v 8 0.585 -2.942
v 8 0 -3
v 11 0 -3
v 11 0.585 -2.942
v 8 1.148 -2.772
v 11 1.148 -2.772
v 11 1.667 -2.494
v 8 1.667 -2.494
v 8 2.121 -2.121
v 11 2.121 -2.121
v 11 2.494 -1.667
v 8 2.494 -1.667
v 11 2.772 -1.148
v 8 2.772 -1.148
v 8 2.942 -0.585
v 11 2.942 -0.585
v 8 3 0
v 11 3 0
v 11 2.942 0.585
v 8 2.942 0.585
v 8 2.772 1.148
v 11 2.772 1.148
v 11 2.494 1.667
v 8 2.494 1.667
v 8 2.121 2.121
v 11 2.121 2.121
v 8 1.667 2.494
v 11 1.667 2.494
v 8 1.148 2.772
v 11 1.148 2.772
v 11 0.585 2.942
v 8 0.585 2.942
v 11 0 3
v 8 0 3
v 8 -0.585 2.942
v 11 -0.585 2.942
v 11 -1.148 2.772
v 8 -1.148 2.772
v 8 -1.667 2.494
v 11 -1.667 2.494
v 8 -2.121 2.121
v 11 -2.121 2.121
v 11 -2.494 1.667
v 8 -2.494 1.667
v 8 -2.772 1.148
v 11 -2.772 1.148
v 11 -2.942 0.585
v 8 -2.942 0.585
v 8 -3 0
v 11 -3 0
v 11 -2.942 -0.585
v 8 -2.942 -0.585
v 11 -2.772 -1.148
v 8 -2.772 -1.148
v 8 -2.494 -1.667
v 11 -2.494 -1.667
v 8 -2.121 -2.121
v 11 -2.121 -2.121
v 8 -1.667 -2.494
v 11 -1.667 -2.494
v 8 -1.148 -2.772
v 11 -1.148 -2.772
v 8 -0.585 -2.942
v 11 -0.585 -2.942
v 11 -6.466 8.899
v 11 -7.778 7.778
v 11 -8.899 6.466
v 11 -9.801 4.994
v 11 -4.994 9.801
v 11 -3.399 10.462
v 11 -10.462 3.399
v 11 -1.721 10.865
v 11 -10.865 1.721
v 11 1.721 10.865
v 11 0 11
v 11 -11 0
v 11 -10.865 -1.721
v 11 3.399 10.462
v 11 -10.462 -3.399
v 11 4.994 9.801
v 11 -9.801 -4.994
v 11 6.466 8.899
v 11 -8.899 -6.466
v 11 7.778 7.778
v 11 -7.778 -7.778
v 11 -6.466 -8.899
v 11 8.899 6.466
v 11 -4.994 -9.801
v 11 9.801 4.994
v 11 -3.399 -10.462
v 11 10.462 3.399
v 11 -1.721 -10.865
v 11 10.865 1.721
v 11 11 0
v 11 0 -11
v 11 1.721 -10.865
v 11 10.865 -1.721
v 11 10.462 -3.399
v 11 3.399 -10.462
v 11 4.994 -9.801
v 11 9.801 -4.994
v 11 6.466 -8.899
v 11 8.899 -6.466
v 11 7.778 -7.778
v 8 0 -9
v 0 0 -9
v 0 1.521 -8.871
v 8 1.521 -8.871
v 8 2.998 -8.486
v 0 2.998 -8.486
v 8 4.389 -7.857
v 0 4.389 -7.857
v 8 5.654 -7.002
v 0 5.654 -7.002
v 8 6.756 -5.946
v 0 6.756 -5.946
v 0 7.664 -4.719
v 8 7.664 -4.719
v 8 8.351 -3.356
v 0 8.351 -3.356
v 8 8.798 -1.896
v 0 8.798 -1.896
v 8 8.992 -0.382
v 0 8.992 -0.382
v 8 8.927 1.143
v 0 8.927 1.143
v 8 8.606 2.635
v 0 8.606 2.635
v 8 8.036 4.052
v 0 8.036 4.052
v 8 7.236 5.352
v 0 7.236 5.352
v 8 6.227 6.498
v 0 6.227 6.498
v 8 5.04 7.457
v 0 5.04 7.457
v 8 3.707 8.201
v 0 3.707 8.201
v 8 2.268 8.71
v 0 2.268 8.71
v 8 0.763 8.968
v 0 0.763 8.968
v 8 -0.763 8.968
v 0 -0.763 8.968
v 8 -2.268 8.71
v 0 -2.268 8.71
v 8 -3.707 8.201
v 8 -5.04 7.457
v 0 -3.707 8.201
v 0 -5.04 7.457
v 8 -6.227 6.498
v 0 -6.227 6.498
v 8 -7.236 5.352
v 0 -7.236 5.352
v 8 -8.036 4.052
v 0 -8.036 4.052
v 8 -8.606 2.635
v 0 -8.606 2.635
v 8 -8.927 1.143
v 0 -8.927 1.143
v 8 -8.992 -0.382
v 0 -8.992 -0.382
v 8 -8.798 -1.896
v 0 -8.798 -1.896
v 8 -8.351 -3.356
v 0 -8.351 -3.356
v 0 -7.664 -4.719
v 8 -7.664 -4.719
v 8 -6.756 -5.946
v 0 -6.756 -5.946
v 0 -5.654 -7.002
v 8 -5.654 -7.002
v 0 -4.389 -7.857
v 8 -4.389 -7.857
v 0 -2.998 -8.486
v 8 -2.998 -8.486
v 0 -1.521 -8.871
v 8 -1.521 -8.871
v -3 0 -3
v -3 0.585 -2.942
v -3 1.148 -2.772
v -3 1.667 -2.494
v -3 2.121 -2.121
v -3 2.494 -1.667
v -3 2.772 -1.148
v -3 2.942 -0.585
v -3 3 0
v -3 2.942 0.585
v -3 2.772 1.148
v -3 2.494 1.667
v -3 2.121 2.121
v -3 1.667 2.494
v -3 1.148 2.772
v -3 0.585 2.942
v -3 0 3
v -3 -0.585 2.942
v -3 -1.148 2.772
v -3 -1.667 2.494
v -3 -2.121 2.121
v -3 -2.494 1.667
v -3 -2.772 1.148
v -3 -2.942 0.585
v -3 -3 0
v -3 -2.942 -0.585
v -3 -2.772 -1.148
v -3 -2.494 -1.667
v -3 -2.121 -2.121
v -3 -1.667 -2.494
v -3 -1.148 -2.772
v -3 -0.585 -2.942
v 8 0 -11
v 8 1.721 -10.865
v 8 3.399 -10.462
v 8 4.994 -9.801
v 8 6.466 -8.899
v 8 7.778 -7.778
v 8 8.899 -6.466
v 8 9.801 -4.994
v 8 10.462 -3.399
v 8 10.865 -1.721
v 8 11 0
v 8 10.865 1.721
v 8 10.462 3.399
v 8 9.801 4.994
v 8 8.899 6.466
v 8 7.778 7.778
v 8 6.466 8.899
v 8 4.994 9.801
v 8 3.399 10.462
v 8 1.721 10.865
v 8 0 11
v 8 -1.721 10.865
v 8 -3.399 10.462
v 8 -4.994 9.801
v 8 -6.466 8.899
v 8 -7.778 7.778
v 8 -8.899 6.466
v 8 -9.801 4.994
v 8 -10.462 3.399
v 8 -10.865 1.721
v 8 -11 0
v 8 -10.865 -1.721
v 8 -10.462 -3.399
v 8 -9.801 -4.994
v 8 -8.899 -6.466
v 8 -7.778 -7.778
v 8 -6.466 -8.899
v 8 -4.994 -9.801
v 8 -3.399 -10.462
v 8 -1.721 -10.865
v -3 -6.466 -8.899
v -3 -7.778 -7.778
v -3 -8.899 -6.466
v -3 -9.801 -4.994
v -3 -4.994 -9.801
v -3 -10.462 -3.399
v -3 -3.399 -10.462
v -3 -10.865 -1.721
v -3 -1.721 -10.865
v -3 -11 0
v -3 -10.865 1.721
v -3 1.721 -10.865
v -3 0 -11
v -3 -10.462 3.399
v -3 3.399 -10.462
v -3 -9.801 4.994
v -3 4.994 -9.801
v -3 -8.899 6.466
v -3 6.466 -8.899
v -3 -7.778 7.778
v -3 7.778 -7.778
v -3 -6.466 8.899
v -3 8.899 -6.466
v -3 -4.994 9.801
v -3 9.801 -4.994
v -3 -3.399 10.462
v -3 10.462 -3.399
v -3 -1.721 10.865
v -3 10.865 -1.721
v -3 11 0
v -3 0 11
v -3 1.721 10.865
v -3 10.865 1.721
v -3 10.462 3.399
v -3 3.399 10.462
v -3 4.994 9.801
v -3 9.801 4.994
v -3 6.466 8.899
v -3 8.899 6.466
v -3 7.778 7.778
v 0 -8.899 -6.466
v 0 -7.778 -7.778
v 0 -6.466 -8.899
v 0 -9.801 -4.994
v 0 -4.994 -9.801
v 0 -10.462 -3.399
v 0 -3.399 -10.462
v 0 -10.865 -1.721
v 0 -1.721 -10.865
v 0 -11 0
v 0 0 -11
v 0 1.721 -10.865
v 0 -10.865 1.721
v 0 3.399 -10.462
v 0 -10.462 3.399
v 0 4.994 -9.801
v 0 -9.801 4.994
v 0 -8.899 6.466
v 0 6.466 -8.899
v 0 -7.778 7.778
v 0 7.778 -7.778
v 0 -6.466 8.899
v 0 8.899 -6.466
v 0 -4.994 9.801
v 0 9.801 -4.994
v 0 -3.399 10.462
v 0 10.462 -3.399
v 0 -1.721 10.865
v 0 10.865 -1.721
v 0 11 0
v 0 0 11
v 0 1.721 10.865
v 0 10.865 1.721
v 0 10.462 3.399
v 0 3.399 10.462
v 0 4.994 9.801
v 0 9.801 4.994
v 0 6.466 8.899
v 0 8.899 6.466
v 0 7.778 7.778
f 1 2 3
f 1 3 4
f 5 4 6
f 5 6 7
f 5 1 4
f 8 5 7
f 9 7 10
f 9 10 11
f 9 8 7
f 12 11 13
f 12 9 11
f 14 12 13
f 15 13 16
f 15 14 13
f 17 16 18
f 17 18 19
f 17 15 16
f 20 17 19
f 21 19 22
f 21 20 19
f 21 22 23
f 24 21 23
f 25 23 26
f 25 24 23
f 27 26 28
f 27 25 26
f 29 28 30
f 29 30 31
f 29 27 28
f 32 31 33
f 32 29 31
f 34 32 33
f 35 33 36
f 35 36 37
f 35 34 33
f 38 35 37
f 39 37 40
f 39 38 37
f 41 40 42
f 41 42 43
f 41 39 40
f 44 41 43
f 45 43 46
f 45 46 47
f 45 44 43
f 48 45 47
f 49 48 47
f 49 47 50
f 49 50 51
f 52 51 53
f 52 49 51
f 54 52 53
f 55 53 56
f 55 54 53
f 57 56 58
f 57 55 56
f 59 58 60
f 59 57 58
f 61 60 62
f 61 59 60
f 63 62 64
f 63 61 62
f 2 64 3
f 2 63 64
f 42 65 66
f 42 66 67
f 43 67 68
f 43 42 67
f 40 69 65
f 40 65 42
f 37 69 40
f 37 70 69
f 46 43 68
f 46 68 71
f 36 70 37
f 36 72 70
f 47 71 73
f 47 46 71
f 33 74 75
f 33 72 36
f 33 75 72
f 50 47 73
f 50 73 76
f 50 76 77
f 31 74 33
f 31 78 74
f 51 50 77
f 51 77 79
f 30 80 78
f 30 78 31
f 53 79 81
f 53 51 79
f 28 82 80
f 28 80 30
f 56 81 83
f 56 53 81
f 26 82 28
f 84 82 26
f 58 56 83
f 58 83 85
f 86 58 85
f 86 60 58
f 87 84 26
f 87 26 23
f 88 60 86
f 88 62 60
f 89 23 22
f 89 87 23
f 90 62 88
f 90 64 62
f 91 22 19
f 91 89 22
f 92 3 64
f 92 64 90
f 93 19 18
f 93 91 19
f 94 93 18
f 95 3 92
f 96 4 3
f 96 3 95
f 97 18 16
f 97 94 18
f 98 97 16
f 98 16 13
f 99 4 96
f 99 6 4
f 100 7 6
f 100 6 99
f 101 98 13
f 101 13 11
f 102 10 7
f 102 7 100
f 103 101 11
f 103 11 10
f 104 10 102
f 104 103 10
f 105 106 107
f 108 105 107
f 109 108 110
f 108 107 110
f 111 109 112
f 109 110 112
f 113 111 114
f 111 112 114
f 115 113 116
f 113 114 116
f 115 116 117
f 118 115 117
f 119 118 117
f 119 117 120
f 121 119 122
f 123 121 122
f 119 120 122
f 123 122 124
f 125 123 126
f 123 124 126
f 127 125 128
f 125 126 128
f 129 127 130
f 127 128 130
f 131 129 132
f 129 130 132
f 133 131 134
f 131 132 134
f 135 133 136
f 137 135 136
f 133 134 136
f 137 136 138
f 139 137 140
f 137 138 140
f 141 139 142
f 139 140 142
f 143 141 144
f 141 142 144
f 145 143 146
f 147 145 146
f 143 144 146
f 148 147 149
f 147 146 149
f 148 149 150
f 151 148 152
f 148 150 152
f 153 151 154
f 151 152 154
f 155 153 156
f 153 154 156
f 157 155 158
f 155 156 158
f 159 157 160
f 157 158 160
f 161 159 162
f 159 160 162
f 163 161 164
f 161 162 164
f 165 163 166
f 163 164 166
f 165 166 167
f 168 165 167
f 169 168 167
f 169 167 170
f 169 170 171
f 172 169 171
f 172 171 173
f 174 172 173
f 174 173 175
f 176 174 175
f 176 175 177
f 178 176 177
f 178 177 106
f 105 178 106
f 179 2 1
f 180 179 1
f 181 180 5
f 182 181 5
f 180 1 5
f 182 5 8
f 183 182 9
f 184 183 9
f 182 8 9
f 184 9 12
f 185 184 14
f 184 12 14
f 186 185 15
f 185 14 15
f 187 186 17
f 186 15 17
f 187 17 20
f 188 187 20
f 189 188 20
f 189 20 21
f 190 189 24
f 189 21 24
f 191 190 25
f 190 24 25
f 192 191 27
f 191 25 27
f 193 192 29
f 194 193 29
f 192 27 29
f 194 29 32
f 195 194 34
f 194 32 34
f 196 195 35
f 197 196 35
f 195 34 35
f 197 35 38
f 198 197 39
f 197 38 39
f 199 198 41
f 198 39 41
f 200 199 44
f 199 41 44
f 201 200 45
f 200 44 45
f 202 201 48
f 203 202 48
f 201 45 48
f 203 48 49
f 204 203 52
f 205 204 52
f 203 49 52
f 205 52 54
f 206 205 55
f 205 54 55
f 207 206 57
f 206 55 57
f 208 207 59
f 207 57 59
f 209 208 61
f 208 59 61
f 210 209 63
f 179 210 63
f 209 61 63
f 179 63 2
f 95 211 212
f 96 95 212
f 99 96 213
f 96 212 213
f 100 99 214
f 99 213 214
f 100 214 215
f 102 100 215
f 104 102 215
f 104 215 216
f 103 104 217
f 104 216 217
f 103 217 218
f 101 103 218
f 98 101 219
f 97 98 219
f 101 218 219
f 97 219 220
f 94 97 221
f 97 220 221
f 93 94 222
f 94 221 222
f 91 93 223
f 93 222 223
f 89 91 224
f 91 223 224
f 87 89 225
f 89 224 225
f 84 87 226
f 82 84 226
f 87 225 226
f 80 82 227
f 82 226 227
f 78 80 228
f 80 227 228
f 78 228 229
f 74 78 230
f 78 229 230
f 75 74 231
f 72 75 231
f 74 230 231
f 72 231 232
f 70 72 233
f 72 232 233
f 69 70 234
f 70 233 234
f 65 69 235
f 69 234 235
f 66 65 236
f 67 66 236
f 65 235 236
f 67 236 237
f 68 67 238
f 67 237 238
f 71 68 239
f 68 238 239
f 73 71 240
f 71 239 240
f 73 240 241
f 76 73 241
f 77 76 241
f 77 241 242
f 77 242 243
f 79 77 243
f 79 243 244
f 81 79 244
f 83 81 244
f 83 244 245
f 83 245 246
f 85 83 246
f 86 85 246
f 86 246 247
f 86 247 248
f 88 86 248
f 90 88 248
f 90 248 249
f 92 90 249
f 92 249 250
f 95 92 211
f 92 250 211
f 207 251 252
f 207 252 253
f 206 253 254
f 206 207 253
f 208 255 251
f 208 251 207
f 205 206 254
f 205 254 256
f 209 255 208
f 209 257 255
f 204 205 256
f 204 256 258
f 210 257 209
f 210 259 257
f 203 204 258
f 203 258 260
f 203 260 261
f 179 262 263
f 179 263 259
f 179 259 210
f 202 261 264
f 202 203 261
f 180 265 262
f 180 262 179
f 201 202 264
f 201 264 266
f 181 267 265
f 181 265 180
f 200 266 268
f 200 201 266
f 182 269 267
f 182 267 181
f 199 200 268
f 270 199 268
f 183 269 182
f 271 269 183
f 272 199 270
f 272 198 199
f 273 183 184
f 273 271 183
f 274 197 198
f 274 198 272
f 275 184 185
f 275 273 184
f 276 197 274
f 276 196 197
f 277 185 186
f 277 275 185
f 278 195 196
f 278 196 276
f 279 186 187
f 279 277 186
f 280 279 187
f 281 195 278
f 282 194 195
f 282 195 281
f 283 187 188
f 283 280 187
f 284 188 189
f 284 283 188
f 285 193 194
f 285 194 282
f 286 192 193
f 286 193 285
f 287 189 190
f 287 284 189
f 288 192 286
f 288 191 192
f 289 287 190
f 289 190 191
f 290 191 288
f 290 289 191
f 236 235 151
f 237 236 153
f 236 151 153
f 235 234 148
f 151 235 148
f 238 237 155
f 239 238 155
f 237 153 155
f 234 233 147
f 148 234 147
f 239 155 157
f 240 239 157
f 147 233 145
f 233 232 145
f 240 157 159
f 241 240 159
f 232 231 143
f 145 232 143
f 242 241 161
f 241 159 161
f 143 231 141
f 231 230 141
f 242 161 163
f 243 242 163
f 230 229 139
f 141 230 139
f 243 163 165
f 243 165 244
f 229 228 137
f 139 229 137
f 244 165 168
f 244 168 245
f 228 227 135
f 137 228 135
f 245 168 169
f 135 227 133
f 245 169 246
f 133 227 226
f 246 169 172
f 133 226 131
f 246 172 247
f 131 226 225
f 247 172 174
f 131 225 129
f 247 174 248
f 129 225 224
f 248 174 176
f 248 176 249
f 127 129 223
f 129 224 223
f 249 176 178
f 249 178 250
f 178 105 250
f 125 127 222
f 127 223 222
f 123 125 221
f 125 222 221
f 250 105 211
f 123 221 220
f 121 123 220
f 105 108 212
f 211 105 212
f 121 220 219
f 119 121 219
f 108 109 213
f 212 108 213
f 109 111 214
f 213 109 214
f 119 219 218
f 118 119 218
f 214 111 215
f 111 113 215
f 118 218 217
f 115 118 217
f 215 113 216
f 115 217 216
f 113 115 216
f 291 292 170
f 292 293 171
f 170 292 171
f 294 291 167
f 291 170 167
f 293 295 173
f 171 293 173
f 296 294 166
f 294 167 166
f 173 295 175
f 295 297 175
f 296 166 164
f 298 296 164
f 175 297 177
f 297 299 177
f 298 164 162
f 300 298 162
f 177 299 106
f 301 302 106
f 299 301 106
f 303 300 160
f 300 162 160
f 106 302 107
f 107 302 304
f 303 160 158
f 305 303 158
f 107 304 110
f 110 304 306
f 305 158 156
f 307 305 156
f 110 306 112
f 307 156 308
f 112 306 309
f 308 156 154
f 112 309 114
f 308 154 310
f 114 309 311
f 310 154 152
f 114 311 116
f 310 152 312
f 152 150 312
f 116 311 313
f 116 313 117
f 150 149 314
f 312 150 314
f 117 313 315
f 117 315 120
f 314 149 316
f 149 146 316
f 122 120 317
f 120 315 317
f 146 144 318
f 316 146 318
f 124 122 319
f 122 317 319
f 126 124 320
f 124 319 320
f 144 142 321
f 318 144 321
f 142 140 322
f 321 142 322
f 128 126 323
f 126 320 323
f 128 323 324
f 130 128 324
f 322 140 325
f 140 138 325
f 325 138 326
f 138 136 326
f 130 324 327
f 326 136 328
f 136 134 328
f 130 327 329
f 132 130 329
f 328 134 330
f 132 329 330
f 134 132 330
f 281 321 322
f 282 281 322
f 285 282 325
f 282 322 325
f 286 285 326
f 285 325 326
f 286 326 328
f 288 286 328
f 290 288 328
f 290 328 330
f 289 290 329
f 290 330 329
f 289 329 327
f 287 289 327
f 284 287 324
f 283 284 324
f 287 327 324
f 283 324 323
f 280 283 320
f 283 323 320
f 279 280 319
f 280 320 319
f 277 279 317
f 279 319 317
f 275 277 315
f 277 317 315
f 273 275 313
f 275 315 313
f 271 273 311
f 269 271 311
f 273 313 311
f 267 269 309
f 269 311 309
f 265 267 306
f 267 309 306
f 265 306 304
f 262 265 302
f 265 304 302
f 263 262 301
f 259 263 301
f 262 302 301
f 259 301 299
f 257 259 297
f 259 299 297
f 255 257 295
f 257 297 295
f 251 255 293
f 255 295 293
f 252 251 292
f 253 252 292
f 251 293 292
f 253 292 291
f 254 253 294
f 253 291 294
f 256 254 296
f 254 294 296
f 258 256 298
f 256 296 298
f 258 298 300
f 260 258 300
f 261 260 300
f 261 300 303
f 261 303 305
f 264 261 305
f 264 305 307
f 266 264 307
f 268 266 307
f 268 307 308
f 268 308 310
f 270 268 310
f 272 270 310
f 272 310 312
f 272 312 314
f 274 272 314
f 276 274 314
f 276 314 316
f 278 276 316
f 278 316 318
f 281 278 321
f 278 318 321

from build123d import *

# Parameters (mm, degrees)
SKETCH1_R               = 9
BOSS_EXTRUDE1_DEPTH     = 8
SKETCH3_R               = 11
BOSS_EXTRUDE2_DEPTH     = 3
SKETCH4_R               = 11
BOSS_EXTRUDE3_DEPTH     = 3
SKETCH2_R               = 3
CUT_EXTRUDE1_DEPTH      = 3
CUT_EXTRUDE1_DEPTH_BACK = 11


with BuildPart() as part:
    # Sketch1 → Boss-Extrude1 (new body)
    with BuildSketch(Plane(origin=(0, 0, 0), x_dir=(0, 0, -1), z_dir=(1, 0, 0))):
        Circle(SKETCH1_R)
    extrude(amount=BOSS_EXTRUDE1_DEPTH)

    # Sketch3 → Boss-Extrude2 (add)
    with BuildSketch(Plane(origin=(8, 0, 0), x_dir=(0, 0, -1), z_dir=(1, 0, 0))):
        Circle(SKETCH3_R)
    extrude(amount=BOSS_EXTRUDE2_DEPTH)

    # Sketch4 → Boss-Extrude3 (add)
    with BuildSketch(Plane.ZY):
        Circle(SKETCH4_R)
    extrude(amount=BOSS_EXTRUDE3_DEPTH)

    # Sketch2 → Cut-Extrude1 (cut, two sides)
    with BuildSketch(Plane(origin=(8, 0, 0), x_dir=(0, 0, -1), z_dir=(1, 0, 0))) as cut_extrude1_sk:
        Circle(SKETCH2_R)
    extrude(amount=CUT_EXTRUDE1_DEPTH, mode=Mode.SUBTRACT)
    extrude(cut_extrude1_sk.sketch, amount=-CUT_EXTRUDE1_DEPTH_BACK, mode=Mode.SUBTRACT)


solid = part.part
